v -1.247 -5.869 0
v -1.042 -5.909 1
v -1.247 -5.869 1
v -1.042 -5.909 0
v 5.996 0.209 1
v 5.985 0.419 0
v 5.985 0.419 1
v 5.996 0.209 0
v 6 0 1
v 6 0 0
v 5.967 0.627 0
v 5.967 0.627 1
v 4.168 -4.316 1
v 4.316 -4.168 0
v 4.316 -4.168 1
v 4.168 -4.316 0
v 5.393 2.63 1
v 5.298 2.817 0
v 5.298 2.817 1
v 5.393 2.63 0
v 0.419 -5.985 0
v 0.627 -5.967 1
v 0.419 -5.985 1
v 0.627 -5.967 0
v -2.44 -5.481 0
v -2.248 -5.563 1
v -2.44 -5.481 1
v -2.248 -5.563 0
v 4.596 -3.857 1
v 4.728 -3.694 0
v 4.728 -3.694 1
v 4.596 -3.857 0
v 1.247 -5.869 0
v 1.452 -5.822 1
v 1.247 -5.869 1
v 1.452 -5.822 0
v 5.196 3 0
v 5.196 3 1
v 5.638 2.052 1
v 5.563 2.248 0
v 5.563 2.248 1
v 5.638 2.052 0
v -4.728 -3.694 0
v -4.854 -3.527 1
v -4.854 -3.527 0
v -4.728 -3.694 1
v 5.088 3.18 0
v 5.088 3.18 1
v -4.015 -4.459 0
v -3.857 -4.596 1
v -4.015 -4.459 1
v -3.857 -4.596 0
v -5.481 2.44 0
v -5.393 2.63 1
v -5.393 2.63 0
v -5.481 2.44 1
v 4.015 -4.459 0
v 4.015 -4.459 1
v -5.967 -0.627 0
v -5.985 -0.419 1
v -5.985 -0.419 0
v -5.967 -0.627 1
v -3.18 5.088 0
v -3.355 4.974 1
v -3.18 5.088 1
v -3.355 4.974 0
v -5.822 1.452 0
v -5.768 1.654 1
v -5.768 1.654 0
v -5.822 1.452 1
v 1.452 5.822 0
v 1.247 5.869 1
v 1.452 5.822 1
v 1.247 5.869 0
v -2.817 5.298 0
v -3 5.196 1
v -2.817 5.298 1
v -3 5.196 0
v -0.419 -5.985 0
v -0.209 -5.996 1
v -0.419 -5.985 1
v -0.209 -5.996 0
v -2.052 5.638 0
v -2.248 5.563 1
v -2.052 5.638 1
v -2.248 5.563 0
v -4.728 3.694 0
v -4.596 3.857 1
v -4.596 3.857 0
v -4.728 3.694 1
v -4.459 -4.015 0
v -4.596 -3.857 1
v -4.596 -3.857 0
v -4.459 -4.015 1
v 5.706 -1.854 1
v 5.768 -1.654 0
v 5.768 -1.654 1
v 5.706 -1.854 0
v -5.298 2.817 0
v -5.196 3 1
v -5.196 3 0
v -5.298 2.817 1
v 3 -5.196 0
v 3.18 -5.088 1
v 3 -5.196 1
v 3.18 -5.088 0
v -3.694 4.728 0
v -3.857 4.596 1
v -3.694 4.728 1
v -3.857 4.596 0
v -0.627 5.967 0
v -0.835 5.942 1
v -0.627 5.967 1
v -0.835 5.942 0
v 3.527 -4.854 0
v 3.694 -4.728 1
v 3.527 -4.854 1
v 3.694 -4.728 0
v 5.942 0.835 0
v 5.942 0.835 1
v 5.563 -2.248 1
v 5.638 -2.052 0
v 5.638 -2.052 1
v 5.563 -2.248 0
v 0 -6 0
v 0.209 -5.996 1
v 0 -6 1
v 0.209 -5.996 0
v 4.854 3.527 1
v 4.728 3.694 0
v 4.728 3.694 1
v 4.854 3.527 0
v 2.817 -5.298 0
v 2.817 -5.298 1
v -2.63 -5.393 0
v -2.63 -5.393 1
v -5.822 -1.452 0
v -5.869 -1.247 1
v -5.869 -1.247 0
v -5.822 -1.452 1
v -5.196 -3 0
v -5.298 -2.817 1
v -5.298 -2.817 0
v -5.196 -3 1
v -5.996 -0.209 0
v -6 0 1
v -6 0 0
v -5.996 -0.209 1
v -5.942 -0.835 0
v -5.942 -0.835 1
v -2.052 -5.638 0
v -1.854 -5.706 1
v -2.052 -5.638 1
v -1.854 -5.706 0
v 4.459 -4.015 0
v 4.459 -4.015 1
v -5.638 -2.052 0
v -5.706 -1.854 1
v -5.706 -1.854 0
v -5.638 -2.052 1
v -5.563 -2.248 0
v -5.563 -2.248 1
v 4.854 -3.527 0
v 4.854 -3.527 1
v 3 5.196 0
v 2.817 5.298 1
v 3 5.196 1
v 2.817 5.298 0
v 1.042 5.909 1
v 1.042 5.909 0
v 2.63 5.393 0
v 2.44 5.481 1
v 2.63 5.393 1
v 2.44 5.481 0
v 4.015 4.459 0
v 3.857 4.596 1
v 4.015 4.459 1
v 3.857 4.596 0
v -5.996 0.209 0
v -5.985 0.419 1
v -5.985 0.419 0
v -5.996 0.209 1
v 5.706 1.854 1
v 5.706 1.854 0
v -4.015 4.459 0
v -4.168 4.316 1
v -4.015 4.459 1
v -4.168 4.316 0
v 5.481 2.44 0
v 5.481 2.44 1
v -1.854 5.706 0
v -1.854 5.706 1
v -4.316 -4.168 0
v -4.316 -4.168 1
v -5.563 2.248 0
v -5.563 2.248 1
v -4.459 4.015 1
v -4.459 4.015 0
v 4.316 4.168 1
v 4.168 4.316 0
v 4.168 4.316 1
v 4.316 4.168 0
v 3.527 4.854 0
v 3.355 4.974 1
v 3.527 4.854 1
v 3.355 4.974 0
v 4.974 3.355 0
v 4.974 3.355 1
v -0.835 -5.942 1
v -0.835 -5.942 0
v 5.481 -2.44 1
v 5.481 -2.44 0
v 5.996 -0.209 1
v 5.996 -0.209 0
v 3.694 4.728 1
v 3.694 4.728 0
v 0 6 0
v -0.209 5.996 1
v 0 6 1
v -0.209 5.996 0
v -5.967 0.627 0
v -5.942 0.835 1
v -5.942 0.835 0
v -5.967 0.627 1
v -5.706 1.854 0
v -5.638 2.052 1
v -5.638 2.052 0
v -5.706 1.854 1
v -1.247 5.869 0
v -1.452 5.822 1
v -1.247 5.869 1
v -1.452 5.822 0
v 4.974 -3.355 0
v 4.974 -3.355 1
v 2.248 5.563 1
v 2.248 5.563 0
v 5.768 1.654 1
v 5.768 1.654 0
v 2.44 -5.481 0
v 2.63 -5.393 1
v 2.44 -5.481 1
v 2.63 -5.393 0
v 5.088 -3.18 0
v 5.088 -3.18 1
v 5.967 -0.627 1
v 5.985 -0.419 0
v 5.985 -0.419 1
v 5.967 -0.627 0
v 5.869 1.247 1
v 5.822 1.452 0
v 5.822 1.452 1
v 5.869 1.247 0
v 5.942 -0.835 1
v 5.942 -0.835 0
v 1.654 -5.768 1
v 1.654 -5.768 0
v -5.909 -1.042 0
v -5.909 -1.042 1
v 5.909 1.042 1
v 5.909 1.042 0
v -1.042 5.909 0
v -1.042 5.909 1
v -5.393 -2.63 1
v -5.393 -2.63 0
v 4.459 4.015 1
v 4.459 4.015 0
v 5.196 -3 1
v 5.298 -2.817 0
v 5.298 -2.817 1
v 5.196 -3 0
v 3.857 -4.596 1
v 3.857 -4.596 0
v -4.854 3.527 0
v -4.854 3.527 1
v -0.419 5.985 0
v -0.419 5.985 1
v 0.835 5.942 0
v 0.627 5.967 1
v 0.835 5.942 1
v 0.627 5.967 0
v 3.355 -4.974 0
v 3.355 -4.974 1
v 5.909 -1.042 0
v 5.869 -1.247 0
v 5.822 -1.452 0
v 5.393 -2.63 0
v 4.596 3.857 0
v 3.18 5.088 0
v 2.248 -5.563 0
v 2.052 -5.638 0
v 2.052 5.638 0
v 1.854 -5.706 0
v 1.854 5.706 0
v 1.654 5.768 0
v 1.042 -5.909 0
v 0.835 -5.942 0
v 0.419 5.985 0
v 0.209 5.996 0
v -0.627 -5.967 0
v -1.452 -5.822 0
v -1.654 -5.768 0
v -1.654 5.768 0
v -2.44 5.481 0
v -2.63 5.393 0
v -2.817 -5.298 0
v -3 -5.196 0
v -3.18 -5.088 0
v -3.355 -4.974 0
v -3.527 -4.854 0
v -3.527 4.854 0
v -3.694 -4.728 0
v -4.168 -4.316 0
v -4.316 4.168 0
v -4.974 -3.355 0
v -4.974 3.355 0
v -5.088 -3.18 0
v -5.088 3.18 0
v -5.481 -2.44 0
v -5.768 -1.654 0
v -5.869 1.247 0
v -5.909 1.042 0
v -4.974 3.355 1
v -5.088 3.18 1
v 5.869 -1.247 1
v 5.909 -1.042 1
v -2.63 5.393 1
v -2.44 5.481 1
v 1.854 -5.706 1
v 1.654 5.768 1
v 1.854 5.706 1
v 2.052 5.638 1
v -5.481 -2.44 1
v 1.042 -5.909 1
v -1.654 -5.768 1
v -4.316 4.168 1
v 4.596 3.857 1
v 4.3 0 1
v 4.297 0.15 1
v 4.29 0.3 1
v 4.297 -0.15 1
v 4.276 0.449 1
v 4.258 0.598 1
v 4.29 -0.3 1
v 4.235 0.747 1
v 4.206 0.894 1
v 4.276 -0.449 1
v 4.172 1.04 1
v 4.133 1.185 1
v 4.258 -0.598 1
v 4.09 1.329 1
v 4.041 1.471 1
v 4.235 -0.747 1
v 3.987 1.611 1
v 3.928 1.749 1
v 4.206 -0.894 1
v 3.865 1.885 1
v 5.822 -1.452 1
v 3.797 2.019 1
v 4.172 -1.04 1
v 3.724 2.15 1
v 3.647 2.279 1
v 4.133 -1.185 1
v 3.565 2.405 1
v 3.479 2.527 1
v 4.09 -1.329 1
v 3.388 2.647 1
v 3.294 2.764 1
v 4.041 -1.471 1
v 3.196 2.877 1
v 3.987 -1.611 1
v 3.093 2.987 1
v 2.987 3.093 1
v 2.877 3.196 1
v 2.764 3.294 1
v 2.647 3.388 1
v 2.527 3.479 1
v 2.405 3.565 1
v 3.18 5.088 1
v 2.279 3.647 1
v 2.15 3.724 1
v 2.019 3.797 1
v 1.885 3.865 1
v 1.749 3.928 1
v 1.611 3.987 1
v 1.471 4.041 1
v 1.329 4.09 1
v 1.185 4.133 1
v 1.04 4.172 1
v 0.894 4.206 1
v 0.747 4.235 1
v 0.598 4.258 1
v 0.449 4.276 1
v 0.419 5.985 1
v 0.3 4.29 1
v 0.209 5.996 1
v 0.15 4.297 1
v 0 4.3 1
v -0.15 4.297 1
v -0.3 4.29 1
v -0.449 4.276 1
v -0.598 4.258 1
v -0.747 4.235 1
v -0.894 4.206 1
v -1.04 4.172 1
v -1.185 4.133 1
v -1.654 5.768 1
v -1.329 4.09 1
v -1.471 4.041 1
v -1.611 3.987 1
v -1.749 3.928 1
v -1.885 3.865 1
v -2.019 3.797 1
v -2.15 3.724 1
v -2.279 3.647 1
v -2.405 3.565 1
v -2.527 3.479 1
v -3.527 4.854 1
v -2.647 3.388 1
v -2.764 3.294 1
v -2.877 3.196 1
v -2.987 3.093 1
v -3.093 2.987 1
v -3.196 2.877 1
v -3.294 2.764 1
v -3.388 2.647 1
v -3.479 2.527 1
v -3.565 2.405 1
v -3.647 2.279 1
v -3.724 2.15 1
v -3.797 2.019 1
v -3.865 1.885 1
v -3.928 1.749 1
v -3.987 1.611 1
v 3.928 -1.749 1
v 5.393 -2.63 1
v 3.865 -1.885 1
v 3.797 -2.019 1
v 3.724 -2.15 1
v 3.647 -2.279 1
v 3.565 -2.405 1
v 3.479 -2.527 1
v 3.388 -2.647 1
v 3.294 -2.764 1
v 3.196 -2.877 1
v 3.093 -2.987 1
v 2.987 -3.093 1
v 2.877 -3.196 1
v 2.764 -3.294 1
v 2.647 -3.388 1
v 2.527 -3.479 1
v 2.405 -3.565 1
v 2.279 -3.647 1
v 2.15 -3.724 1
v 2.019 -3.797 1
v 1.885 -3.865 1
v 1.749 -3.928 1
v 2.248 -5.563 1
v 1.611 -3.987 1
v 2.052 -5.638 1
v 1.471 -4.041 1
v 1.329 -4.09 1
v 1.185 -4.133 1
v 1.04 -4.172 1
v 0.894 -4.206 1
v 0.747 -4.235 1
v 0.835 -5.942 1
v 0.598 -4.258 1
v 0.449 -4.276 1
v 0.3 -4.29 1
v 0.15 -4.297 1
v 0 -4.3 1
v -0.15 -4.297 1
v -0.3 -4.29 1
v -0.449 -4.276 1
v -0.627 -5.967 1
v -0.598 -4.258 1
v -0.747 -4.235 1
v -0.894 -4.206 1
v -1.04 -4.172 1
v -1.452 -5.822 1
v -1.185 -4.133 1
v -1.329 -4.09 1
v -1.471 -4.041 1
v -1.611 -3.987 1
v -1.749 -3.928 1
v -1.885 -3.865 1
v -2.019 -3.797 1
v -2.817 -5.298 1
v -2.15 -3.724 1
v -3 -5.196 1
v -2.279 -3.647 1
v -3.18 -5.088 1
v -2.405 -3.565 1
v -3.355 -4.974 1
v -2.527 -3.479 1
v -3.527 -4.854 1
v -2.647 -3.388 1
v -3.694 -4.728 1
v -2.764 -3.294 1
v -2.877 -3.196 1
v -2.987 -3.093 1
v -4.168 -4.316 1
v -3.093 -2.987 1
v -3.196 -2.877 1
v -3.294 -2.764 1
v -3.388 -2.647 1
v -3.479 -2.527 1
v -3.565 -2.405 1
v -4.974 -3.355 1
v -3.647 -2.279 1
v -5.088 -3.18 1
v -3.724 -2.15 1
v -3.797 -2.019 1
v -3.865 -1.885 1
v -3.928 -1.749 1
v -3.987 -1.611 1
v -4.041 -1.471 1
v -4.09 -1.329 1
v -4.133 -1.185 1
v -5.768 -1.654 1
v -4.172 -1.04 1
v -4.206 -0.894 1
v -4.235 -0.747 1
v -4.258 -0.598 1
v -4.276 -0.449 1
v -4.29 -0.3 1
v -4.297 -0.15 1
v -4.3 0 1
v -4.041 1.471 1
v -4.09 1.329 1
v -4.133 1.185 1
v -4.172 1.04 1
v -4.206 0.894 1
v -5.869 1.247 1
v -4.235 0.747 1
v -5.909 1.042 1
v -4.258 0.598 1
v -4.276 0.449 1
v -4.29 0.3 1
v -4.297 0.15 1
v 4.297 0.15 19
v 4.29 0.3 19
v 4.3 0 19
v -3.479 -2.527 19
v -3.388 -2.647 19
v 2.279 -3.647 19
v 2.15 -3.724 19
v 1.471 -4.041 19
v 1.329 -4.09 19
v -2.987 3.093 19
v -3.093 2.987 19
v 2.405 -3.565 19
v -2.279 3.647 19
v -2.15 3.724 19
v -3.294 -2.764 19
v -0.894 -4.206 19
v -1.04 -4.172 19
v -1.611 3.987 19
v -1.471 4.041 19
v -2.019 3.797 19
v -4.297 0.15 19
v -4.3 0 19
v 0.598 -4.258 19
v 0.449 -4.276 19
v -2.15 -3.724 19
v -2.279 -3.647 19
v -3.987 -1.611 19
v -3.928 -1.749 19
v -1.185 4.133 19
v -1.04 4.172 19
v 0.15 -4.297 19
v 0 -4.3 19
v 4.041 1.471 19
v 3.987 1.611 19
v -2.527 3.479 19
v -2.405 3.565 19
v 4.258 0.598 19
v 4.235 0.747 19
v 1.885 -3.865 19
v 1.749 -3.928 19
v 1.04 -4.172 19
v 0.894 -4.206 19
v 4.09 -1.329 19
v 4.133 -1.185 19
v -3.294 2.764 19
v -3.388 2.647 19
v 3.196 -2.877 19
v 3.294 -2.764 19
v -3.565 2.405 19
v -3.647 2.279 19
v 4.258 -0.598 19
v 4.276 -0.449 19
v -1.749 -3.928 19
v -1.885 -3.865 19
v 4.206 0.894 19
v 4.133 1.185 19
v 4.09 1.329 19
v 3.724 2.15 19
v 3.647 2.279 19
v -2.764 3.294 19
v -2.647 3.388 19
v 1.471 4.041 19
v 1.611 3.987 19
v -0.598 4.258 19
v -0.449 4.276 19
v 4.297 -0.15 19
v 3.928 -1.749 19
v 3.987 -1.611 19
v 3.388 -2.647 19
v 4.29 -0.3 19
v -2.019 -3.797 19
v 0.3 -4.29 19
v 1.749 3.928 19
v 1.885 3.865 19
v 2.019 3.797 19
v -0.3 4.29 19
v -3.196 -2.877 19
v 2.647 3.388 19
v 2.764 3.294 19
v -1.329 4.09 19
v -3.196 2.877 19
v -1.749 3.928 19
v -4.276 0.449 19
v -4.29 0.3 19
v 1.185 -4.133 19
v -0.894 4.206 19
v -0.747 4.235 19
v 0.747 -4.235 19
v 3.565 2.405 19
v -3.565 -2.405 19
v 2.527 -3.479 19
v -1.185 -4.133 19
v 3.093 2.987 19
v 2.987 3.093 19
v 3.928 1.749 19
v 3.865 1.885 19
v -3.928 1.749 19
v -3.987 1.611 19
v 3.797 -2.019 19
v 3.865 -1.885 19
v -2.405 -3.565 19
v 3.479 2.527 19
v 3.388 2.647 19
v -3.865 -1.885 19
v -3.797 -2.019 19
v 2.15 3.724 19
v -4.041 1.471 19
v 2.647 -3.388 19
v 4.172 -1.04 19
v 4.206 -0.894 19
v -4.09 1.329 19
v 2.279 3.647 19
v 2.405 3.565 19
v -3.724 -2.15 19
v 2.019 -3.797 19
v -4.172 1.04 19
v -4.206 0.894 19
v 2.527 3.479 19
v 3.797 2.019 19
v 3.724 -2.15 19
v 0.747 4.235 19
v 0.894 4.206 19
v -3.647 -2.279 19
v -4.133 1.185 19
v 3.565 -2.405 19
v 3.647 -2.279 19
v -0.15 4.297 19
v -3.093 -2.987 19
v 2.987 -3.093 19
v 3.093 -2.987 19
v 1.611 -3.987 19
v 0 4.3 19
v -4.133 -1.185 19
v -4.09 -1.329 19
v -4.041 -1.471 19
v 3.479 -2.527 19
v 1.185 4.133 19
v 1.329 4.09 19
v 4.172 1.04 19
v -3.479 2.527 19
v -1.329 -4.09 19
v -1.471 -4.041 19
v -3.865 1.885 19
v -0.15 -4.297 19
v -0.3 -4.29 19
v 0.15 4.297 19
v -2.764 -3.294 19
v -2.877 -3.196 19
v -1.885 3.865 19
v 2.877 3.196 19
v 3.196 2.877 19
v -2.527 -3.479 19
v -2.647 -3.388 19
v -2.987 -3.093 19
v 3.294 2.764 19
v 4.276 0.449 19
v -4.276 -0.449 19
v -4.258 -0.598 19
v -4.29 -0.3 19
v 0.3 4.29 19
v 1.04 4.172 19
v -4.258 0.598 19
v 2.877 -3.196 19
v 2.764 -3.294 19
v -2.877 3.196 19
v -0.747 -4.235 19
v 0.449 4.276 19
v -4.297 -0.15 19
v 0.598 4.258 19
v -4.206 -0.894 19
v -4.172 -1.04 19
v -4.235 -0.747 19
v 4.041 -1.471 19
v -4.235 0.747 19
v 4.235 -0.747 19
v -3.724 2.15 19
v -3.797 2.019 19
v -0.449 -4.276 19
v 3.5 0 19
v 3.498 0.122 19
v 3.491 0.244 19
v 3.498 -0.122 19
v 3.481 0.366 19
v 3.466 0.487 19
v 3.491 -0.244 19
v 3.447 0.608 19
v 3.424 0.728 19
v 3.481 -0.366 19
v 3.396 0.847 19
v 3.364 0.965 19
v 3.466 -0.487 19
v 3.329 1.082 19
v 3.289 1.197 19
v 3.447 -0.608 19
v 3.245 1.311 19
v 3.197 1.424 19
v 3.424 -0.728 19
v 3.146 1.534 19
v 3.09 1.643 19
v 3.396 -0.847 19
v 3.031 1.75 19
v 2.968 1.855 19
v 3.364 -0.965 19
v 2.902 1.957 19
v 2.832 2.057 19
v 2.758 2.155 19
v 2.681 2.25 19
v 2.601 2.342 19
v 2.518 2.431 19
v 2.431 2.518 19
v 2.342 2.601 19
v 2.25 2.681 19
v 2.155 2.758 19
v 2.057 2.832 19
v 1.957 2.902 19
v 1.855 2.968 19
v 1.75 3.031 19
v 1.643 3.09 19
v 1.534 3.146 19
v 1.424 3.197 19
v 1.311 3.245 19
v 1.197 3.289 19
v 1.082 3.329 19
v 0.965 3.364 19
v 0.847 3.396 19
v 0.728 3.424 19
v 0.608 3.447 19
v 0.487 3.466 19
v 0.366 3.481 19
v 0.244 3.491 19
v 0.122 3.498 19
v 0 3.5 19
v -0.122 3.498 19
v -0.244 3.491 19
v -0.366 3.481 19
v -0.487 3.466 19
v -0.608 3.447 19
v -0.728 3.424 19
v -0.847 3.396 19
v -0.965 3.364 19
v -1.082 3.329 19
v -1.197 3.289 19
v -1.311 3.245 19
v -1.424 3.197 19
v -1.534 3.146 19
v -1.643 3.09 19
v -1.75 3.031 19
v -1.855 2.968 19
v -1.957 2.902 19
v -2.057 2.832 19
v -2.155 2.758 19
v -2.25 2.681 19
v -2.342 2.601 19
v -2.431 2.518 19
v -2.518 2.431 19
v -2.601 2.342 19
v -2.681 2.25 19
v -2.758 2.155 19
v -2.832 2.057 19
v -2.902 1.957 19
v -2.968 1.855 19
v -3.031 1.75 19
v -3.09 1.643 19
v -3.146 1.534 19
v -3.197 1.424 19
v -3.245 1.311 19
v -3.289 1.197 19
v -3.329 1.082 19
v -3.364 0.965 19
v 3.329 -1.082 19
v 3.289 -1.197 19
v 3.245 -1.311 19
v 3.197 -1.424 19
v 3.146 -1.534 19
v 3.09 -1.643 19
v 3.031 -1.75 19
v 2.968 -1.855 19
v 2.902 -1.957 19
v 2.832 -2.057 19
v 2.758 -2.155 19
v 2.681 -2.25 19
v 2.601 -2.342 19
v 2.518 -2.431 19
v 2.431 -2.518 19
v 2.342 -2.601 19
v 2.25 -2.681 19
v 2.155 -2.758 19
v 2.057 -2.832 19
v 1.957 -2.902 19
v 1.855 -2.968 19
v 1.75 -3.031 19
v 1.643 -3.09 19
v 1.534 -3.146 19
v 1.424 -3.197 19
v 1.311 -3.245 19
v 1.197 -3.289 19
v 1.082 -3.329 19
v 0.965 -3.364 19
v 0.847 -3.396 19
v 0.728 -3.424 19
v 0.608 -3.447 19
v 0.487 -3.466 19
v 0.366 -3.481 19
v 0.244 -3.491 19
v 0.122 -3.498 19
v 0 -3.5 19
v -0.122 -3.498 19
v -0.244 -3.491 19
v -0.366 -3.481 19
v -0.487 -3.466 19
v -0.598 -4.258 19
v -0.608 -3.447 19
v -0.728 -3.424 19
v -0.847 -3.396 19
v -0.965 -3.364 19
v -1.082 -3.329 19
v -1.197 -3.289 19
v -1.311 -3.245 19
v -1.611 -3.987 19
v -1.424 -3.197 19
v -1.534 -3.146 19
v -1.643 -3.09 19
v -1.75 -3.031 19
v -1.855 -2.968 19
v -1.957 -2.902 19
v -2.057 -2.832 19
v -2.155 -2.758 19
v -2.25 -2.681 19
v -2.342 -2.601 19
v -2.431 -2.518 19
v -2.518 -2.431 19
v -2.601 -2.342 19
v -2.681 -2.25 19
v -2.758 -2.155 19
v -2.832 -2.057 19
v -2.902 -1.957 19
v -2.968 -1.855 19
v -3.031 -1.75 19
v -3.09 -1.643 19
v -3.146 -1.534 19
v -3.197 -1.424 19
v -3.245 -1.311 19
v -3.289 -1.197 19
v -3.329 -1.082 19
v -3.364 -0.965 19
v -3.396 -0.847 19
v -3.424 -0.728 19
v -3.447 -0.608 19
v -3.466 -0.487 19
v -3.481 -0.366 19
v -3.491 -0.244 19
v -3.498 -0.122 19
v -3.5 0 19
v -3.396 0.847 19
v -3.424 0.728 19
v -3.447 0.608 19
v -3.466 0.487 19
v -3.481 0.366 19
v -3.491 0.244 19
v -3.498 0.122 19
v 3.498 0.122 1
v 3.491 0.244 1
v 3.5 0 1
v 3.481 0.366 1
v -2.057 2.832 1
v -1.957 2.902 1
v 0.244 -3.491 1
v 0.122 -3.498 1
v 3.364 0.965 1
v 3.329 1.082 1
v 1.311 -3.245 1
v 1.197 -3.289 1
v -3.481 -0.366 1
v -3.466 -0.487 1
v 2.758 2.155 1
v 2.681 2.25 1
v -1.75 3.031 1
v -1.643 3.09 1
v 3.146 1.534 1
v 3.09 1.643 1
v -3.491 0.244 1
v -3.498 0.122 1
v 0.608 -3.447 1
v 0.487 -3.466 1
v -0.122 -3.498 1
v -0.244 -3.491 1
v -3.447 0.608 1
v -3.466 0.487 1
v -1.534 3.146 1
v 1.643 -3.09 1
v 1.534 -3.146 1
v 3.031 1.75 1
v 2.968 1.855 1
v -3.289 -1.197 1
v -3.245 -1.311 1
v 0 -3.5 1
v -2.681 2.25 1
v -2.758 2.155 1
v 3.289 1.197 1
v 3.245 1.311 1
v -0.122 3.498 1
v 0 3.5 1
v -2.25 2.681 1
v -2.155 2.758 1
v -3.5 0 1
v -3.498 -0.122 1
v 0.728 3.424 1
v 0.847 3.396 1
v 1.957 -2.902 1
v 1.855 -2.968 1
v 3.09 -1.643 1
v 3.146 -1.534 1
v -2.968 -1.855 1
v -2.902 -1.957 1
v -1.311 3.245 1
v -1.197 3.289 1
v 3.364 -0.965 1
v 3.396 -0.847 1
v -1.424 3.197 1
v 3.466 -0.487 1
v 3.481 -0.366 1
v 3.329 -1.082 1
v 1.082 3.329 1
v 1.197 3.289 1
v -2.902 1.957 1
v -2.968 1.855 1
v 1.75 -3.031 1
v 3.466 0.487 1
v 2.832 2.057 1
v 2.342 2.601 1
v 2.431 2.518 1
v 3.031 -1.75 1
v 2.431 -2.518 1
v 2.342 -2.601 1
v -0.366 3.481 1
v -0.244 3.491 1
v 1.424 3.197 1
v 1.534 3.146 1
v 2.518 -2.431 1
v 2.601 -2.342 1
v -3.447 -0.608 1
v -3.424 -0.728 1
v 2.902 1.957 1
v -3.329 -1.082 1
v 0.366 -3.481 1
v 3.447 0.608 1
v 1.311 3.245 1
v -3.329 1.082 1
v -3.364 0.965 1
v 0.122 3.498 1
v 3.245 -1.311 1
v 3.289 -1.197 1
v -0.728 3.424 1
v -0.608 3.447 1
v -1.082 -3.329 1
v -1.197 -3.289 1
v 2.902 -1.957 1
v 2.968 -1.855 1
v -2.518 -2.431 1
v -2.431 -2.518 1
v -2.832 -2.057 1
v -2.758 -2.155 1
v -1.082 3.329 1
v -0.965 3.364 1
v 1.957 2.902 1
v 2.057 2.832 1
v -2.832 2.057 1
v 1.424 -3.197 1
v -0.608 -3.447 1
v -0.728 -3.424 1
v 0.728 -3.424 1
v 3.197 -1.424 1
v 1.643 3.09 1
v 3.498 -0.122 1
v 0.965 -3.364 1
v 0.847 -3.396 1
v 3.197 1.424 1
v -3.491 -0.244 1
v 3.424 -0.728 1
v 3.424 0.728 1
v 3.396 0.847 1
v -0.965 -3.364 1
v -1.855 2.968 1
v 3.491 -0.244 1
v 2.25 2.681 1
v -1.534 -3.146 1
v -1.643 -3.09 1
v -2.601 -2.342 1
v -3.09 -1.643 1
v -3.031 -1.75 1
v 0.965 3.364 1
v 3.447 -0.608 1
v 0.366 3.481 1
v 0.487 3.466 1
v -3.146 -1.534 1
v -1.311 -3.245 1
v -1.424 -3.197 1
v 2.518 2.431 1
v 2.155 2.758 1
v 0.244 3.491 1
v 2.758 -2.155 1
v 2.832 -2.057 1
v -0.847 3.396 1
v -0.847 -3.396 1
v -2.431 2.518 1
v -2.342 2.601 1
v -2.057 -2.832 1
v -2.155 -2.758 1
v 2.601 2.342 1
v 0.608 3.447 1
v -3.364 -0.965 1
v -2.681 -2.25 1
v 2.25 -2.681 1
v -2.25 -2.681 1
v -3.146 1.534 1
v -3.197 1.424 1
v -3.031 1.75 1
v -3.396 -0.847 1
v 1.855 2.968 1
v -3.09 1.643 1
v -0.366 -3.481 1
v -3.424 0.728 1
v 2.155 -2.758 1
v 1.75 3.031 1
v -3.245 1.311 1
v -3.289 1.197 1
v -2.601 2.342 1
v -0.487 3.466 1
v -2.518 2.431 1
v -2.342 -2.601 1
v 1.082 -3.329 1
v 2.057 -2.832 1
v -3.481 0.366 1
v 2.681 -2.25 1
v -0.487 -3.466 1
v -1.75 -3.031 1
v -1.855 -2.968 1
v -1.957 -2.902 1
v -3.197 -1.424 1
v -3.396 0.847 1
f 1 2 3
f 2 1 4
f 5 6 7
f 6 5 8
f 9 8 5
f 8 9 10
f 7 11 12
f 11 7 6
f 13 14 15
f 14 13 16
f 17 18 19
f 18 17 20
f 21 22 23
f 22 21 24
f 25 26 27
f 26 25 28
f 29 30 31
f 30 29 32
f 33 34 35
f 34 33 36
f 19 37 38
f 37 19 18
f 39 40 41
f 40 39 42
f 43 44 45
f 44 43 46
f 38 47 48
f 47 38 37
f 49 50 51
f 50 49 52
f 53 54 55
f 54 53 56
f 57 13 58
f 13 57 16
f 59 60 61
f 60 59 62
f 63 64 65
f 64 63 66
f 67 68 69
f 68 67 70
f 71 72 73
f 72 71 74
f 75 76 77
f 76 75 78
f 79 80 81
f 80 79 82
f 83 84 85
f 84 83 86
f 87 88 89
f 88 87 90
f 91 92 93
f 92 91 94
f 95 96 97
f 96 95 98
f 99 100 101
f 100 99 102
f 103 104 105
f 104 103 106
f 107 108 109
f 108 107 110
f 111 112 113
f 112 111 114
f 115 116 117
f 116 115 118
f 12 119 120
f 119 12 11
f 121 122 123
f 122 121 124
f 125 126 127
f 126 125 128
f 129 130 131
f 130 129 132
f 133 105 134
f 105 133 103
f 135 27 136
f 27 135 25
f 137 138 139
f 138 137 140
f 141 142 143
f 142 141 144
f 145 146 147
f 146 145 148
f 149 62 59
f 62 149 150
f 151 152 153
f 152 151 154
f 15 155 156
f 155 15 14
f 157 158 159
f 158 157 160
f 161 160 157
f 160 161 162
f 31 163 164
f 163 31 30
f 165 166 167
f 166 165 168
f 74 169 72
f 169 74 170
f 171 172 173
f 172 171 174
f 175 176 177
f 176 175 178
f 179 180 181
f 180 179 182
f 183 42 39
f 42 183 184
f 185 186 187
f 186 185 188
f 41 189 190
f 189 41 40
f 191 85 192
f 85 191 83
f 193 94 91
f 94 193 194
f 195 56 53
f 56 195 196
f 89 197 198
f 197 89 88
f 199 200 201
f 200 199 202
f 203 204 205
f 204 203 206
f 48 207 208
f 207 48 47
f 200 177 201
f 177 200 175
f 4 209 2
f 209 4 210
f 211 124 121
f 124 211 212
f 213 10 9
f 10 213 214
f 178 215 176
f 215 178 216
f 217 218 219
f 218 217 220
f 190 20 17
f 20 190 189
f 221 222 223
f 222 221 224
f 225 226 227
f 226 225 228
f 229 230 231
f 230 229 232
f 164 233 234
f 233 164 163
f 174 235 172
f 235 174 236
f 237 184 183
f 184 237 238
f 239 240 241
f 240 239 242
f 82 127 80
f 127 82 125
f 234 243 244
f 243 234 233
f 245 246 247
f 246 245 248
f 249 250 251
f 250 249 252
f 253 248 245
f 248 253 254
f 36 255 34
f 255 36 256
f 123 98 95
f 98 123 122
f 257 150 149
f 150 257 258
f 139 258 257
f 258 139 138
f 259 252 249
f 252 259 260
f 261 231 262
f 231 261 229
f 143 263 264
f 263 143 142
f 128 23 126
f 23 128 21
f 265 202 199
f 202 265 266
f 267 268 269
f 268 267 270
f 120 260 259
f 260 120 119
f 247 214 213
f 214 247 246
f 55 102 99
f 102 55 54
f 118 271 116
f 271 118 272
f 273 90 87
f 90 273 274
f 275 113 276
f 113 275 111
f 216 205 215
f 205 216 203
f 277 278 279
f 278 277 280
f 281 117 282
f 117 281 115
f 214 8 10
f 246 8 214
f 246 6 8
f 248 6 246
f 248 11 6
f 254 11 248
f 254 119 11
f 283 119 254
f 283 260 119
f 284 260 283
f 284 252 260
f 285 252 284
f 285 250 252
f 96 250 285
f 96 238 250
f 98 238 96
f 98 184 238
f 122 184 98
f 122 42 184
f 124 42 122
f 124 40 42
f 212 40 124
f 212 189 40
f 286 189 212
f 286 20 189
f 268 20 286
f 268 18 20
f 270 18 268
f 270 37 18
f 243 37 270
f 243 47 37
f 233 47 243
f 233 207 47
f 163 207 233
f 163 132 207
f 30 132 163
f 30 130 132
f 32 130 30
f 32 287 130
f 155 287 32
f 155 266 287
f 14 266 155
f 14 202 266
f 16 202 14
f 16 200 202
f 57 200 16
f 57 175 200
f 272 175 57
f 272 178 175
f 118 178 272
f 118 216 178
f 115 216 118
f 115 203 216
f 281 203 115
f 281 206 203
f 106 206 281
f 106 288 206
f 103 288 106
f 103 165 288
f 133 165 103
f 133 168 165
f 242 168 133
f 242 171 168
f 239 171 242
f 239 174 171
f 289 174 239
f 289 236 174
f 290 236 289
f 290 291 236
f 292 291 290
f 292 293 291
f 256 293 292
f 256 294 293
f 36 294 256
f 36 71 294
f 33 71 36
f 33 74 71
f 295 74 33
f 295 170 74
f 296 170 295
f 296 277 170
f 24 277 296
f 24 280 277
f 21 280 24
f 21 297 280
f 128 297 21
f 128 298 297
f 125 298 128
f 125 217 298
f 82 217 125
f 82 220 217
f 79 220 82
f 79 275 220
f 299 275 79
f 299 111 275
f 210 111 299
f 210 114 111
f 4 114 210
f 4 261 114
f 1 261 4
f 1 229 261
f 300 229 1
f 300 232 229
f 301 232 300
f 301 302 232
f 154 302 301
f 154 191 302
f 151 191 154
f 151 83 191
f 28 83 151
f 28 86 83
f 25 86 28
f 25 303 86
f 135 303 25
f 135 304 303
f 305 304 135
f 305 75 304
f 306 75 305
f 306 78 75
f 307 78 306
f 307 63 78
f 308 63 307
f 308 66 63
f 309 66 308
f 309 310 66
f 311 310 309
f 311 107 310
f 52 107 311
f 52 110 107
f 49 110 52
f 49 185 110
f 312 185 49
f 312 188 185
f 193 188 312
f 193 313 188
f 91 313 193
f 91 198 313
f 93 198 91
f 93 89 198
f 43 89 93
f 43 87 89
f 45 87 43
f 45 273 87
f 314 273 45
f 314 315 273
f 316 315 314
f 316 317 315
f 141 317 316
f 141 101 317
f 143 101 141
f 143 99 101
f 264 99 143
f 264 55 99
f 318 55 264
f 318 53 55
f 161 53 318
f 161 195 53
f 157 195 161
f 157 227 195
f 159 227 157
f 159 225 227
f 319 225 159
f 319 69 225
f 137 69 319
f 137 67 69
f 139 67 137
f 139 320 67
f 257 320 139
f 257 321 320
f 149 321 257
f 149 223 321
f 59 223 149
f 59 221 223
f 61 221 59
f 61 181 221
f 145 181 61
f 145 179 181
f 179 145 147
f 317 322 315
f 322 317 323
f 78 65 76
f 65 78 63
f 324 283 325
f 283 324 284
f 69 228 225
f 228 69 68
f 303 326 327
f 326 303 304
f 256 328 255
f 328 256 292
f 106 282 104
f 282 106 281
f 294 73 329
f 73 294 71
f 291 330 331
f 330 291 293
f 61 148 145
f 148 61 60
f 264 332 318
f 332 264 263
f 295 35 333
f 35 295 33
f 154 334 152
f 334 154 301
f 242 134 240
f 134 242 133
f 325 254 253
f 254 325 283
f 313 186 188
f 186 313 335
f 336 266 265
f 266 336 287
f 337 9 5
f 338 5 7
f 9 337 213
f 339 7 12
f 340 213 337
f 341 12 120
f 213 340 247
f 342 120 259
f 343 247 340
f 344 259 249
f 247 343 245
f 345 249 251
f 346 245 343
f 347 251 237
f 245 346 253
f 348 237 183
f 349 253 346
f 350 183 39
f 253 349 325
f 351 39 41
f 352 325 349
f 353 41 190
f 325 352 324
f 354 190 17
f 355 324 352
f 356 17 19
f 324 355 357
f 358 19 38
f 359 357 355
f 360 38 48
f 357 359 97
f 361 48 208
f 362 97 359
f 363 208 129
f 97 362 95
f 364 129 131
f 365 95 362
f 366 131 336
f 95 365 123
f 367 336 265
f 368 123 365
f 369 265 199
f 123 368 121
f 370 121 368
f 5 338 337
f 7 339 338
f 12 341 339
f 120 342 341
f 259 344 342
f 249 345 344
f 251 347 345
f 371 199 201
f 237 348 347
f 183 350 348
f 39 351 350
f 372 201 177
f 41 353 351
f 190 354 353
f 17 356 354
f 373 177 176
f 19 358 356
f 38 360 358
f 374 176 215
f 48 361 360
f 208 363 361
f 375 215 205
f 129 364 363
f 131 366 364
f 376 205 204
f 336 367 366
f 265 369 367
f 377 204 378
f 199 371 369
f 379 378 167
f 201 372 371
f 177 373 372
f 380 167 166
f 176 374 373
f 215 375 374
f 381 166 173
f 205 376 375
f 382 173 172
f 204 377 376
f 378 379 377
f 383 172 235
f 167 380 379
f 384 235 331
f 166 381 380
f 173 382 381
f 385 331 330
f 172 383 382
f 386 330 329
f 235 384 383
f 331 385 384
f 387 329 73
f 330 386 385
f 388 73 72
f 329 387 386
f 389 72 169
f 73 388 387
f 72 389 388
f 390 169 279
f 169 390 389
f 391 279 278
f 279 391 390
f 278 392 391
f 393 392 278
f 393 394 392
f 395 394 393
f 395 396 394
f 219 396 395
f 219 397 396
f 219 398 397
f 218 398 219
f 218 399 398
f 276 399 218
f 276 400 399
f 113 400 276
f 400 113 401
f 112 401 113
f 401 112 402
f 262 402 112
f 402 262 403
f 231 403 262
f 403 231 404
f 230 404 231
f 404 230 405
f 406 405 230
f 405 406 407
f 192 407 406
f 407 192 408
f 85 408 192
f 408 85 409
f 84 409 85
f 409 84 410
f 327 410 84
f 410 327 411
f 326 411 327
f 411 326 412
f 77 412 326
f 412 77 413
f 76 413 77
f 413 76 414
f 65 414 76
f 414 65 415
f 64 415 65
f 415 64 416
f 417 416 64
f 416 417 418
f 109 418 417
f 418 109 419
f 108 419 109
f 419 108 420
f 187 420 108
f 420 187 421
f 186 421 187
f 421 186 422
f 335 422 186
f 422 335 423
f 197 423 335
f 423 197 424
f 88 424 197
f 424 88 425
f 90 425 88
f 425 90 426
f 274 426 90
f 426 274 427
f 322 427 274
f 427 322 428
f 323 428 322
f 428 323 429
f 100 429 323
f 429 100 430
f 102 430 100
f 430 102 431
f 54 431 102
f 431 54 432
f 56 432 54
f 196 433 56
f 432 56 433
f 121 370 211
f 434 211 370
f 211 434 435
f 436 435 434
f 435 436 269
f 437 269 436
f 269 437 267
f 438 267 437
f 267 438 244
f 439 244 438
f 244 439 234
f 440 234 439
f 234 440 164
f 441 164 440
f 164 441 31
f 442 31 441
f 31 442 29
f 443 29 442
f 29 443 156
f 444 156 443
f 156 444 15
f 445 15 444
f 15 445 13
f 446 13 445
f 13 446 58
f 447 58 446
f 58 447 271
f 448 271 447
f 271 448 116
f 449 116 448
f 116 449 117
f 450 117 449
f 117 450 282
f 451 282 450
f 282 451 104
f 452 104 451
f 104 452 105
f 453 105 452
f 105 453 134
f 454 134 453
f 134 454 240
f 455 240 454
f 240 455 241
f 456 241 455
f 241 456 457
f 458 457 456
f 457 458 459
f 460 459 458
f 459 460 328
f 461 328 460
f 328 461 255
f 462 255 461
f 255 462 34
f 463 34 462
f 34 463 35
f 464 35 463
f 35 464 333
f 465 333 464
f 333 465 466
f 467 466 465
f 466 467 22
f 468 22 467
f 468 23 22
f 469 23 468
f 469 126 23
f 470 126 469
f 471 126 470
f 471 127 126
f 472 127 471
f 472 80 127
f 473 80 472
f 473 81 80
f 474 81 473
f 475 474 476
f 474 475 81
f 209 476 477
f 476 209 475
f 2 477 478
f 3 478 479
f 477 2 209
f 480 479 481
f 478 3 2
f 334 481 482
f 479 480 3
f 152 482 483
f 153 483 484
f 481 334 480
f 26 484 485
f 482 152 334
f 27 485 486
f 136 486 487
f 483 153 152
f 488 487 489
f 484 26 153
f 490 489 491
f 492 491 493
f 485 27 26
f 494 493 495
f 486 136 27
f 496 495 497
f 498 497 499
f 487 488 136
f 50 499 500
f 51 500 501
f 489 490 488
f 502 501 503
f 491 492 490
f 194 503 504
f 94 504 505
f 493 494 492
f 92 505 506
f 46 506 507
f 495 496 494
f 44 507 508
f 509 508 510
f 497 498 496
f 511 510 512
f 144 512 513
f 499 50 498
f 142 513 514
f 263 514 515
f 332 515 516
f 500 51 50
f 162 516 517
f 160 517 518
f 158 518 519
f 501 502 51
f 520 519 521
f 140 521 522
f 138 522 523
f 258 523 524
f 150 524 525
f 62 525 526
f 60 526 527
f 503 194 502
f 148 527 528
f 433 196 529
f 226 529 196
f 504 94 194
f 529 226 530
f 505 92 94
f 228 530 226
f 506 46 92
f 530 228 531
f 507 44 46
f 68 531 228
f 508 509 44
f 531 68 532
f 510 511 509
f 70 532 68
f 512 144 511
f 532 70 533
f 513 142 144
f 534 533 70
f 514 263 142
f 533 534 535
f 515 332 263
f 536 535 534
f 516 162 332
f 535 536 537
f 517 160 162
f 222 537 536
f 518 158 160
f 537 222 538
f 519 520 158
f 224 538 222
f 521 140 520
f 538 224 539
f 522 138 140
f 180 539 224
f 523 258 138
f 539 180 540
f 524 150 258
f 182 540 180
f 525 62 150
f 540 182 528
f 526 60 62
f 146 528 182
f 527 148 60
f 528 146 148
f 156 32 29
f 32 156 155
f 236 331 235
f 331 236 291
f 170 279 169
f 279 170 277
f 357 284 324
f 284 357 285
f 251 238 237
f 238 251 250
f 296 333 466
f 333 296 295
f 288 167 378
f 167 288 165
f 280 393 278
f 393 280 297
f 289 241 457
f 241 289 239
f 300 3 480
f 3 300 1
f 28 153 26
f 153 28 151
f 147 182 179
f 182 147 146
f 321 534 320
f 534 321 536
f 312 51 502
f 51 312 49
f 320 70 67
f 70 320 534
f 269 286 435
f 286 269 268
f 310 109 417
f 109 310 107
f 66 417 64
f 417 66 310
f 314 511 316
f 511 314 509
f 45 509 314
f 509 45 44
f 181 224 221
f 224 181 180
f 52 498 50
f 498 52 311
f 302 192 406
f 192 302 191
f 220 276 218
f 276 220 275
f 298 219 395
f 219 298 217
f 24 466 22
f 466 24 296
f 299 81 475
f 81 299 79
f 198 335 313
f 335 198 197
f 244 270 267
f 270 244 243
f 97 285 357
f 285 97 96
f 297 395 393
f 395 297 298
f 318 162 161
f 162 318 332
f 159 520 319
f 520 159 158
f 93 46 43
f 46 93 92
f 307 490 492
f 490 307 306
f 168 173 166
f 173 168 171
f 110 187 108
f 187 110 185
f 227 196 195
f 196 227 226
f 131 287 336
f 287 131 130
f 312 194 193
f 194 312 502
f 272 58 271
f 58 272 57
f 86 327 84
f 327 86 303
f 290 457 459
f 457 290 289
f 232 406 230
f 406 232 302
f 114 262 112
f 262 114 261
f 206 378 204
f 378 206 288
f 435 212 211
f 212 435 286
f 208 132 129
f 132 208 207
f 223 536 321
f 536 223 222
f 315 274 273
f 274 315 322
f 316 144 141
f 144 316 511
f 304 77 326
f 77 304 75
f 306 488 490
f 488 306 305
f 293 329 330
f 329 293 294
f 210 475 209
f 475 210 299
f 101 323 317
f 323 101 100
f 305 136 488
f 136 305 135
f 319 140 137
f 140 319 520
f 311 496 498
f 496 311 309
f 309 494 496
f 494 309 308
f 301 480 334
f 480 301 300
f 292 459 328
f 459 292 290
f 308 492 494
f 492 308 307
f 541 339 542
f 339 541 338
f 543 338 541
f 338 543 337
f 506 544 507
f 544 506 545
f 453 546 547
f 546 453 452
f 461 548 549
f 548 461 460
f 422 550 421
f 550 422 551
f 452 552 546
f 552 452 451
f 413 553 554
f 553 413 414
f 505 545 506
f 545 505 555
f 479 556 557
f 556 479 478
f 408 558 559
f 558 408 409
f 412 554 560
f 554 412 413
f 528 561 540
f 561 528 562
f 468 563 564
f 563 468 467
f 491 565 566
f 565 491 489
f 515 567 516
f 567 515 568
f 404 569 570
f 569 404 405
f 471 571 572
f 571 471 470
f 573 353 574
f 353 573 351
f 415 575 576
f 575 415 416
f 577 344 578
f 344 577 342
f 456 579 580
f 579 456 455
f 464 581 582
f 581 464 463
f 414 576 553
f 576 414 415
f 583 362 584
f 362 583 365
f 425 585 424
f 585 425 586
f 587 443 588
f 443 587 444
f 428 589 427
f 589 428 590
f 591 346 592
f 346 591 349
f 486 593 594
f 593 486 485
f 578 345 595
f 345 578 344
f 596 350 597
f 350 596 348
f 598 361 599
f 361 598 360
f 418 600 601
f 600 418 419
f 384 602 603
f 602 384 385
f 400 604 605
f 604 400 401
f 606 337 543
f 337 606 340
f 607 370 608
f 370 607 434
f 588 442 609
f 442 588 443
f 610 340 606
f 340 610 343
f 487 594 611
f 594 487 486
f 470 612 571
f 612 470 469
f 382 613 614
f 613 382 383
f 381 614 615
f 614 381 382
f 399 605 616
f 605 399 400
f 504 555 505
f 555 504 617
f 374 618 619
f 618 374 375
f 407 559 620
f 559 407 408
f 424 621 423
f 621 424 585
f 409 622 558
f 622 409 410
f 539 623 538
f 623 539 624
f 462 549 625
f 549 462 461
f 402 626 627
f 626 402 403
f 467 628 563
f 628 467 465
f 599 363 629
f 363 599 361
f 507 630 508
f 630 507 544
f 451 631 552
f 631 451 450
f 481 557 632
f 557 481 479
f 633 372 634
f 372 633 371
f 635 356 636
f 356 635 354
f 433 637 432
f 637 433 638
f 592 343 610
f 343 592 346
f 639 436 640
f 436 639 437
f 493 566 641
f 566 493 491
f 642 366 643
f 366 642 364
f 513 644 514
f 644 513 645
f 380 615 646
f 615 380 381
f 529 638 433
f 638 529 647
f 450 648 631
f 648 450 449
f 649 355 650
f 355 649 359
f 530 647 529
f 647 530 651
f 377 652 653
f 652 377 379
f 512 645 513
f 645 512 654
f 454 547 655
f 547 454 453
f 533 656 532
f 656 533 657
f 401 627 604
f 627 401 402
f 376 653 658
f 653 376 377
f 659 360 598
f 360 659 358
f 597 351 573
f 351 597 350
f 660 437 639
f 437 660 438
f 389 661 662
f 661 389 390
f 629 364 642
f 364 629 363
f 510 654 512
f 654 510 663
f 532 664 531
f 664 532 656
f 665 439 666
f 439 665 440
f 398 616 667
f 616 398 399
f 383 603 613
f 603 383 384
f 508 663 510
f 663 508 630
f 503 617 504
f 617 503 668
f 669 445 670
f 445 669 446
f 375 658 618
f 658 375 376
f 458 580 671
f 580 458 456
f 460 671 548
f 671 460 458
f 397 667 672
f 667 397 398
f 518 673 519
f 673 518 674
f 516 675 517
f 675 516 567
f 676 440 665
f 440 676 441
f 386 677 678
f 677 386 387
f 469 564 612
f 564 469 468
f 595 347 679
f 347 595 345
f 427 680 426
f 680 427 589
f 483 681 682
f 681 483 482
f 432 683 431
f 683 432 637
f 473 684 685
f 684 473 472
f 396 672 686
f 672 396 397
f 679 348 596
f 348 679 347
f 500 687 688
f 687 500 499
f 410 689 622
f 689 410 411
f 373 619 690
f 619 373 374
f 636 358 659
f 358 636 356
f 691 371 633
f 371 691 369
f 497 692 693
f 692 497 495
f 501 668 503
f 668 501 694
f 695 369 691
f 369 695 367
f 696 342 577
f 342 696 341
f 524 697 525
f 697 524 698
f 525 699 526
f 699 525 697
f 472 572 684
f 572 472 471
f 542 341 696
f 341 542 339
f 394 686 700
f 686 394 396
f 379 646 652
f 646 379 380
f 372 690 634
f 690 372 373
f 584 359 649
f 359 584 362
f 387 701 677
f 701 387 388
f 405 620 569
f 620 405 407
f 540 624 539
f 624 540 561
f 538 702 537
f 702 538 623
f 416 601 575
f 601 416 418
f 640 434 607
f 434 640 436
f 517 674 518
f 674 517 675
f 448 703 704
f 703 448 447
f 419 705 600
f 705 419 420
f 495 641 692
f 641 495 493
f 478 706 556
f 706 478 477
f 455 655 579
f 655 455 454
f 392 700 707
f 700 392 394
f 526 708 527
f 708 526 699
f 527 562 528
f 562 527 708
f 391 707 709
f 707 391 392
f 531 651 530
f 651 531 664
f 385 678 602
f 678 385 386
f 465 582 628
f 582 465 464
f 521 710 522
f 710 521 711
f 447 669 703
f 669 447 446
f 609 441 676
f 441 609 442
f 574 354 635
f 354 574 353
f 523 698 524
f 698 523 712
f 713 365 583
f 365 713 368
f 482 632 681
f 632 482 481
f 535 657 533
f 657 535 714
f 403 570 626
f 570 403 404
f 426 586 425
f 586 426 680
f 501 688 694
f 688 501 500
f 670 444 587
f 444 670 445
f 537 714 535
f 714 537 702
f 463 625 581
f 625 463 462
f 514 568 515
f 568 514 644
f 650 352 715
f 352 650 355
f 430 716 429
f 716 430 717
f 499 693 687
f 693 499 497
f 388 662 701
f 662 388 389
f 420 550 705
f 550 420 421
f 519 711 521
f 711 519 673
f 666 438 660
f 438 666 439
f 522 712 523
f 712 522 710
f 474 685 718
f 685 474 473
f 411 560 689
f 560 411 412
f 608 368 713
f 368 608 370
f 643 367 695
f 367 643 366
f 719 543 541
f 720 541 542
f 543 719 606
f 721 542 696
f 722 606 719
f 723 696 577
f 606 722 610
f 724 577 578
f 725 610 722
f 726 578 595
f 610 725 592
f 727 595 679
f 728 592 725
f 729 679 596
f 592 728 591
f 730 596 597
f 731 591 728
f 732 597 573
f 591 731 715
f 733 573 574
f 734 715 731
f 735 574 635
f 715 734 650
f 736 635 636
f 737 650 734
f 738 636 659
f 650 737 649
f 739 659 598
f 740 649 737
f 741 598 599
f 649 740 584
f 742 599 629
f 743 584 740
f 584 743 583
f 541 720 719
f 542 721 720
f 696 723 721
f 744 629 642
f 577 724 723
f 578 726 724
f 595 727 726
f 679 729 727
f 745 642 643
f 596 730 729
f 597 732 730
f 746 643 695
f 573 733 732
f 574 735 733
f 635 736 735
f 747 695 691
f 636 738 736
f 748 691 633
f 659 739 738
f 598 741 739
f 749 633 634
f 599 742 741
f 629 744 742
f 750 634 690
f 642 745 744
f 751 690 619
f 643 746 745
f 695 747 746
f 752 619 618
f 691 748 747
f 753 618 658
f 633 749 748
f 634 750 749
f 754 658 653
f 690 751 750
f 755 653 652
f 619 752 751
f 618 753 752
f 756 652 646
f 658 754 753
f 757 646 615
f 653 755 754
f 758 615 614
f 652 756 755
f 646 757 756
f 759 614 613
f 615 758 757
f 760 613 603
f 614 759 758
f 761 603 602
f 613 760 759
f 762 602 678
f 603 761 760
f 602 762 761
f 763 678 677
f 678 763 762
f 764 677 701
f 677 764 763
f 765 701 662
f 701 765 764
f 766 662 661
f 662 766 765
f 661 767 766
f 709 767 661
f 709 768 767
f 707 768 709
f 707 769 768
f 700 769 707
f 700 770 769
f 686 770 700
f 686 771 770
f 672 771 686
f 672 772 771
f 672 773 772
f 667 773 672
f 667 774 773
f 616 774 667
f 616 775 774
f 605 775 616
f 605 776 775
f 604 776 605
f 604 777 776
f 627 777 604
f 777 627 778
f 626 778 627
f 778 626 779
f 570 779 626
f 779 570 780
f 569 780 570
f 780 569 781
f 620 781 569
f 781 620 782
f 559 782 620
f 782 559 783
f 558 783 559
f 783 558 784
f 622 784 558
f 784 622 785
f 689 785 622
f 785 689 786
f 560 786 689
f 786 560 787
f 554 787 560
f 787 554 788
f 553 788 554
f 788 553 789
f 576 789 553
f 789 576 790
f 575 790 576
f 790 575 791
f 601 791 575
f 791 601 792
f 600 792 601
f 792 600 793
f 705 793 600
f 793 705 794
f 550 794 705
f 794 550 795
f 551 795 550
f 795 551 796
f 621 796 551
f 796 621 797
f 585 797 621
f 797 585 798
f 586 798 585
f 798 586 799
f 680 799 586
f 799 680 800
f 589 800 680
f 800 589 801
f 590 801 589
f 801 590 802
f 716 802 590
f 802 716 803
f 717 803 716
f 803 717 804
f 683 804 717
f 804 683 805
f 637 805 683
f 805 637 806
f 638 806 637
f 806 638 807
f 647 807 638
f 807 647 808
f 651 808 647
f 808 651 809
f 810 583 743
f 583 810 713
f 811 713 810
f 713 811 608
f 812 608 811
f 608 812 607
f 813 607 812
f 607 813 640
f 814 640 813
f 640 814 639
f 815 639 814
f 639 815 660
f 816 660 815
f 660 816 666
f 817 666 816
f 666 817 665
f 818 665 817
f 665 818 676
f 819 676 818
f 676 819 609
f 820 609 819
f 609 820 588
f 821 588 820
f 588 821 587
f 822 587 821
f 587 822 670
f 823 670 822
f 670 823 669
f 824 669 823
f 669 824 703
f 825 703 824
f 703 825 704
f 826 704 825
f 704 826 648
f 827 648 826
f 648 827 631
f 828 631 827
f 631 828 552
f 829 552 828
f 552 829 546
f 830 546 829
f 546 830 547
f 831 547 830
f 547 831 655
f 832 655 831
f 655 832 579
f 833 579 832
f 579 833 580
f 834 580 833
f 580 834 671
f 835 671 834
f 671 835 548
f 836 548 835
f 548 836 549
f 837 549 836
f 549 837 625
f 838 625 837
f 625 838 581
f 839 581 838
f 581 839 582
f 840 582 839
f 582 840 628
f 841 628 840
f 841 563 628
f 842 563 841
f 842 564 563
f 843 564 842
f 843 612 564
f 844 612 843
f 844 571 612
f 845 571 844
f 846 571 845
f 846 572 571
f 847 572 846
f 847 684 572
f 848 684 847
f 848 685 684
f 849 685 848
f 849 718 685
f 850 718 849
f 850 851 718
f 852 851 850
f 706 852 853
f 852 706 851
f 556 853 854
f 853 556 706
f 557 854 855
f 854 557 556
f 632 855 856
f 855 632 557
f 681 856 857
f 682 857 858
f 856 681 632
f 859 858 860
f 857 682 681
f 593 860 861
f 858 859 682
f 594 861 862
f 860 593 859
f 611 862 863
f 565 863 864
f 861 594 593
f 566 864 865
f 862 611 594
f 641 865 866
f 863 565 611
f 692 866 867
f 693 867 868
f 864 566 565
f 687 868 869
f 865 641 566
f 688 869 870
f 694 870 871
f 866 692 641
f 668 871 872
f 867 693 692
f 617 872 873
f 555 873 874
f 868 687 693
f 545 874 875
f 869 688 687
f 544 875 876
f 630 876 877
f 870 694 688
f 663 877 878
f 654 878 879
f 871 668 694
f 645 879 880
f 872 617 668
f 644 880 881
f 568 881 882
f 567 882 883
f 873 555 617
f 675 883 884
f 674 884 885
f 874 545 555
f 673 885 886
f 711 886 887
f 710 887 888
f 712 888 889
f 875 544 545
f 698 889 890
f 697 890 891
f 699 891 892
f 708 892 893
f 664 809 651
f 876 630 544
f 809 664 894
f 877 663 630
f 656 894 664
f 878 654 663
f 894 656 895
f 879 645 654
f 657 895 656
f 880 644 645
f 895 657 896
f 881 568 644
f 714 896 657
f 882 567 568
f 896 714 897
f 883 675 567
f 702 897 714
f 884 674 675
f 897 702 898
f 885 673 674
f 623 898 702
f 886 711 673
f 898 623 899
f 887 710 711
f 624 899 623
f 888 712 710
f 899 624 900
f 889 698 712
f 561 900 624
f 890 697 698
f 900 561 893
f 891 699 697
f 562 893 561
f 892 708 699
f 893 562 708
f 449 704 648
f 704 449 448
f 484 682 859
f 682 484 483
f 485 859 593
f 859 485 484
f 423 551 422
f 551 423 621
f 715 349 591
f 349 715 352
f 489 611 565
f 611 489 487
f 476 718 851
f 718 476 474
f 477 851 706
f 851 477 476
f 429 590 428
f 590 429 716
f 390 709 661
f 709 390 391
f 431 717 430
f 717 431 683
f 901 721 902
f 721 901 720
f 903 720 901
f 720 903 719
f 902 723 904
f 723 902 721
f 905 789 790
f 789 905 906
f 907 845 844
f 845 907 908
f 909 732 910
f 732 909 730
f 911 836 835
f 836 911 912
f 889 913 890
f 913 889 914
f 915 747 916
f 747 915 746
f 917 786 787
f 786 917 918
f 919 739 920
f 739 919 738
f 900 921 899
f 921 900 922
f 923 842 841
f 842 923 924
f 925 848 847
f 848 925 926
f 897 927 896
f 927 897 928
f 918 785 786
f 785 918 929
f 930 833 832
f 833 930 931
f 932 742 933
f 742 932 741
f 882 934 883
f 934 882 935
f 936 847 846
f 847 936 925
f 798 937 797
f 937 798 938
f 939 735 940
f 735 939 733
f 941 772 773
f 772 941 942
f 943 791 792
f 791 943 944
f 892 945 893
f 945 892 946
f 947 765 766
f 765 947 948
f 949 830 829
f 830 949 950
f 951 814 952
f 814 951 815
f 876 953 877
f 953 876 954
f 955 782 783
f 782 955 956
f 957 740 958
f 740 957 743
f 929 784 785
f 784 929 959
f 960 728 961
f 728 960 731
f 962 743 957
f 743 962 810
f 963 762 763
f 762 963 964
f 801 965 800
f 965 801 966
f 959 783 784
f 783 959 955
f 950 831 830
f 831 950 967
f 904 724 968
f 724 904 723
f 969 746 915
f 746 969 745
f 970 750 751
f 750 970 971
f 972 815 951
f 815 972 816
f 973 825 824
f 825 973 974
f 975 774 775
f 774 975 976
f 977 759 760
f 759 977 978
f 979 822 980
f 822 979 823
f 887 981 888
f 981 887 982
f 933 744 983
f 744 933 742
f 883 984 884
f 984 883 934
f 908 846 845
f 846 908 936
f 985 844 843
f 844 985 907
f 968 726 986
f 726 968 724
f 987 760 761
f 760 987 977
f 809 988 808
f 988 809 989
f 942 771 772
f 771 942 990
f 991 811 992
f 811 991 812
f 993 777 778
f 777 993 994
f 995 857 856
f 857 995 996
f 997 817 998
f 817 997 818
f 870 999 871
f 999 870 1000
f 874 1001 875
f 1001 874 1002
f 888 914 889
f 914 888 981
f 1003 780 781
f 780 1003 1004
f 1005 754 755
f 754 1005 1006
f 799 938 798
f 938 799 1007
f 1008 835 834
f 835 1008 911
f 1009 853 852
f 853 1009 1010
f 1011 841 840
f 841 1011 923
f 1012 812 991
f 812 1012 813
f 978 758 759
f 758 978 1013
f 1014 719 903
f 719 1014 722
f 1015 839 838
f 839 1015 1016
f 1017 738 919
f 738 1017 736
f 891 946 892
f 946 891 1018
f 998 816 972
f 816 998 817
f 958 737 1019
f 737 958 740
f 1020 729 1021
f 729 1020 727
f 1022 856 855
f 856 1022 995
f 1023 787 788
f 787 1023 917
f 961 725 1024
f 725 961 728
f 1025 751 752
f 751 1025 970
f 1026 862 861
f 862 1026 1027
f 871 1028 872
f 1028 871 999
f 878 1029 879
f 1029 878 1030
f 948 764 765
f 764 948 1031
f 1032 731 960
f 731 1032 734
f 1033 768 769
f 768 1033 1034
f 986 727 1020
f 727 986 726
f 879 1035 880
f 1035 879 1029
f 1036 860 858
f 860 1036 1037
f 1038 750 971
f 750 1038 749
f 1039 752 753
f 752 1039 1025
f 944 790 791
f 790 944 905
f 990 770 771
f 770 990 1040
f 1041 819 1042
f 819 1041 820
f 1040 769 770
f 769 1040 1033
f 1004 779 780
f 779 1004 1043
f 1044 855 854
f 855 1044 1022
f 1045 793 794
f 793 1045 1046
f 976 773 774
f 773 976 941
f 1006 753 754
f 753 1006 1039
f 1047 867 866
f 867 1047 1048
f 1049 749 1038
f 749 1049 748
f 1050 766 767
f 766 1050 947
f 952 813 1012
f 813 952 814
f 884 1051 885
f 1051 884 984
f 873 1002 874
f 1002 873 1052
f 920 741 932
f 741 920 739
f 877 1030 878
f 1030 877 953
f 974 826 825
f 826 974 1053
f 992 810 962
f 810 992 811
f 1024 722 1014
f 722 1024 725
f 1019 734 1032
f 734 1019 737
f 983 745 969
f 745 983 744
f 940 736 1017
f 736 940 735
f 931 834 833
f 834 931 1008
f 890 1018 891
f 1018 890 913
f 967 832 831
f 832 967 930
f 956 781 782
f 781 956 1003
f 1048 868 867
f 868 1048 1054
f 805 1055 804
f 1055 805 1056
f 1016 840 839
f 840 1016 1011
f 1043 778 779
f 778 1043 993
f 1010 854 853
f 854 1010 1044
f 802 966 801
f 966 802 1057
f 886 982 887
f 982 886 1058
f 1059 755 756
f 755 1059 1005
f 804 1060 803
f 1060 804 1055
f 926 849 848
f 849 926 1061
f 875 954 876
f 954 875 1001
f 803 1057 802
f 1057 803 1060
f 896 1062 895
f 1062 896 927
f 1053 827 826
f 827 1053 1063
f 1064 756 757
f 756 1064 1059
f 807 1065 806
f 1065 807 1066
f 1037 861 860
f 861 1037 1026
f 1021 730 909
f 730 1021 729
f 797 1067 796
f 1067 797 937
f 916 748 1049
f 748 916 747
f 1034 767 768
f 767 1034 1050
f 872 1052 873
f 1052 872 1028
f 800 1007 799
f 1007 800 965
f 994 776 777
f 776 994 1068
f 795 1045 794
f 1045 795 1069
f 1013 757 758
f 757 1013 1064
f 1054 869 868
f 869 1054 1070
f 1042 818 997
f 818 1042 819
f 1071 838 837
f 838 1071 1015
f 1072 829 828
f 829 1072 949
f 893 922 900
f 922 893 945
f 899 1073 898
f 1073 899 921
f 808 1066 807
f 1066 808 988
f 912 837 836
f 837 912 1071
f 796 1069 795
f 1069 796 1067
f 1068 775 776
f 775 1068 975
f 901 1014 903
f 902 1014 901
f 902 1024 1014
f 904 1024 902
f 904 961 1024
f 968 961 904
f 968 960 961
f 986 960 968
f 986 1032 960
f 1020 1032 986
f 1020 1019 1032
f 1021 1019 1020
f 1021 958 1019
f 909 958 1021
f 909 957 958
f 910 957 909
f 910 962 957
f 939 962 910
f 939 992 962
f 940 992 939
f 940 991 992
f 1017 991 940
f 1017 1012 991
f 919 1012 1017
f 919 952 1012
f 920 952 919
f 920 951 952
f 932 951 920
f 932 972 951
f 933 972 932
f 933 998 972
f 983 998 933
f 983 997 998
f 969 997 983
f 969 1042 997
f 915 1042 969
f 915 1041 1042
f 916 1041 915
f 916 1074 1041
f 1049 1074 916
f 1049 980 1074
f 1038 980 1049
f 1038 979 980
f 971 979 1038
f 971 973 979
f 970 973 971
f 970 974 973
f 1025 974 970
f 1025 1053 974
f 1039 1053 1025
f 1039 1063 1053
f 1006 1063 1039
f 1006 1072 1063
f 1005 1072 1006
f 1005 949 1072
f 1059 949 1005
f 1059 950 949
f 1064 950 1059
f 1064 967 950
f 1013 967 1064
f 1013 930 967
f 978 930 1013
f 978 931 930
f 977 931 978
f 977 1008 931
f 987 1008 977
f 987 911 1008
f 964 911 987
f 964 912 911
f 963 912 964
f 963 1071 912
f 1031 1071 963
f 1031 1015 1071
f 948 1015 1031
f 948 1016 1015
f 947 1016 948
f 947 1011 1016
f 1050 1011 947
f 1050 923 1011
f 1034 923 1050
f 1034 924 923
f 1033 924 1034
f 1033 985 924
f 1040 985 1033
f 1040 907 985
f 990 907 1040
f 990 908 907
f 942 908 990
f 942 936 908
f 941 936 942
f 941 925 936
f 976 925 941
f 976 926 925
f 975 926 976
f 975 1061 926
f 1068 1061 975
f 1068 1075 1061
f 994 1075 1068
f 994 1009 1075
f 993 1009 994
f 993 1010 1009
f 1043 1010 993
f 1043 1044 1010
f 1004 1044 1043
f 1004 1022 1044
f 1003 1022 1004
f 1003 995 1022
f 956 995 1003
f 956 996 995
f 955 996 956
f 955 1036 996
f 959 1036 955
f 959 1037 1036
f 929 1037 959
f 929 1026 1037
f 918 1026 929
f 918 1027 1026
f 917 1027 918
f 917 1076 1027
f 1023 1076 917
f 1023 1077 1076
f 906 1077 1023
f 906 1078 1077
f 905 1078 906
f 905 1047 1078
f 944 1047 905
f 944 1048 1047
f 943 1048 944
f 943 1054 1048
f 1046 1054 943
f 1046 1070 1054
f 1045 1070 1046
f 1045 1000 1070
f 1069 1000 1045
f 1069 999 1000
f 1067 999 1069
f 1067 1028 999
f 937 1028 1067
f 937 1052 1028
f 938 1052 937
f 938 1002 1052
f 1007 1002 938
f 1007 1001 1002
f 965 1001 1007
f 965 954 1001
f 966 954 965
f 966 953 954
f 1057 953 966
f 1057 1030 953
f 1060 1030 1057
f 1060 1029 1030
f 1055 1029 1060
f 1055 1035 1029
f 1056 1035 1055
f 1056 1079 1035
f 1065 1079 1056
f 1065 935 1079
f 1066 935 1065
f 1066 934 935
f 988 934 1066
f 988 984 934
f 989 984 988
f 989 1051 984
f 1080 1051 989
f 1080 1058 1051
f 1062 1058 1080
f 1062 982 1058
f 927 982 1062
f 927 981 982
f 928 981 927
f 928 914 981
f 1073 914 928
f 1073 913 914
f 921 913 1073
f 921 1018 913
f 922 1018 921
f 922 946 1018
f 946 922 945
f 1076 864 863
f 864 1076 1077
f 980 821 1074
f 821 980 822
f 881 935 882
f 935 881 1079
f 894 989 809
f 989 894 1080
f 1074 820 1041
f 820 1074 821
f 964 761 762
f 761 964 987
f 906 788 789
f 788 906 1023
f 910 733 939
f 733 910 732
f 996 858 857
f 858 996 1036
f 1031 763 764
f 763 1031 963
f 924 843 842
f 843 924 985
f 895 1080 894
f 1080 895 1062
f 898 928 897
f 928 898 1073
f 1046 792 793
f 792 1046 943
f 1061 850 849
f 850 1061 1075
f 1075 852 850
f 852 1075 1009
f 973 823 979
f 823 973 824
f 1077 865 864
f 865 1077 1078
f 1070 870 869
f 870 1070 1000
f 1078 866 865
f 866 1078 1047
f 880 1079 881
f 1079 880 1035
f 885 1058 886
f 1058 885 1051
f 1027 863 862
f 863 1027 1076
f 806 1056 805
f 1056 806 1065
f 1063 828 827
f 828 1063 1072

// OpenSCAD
inner_rad = 3.5;
outer_rad = 4.3;
cap_rad = 6;
cap_height = 1;
height = 18;
$fn=180;
difference() {
    union() {
        cylinder(h=cap_height, r=cap_rad);
        cylinder(h=cap_height+height, r=outer_rad);
    }
    translate([0,0,cap_height])
    cylinder(h=height+.1, r=inner_rad);
}
